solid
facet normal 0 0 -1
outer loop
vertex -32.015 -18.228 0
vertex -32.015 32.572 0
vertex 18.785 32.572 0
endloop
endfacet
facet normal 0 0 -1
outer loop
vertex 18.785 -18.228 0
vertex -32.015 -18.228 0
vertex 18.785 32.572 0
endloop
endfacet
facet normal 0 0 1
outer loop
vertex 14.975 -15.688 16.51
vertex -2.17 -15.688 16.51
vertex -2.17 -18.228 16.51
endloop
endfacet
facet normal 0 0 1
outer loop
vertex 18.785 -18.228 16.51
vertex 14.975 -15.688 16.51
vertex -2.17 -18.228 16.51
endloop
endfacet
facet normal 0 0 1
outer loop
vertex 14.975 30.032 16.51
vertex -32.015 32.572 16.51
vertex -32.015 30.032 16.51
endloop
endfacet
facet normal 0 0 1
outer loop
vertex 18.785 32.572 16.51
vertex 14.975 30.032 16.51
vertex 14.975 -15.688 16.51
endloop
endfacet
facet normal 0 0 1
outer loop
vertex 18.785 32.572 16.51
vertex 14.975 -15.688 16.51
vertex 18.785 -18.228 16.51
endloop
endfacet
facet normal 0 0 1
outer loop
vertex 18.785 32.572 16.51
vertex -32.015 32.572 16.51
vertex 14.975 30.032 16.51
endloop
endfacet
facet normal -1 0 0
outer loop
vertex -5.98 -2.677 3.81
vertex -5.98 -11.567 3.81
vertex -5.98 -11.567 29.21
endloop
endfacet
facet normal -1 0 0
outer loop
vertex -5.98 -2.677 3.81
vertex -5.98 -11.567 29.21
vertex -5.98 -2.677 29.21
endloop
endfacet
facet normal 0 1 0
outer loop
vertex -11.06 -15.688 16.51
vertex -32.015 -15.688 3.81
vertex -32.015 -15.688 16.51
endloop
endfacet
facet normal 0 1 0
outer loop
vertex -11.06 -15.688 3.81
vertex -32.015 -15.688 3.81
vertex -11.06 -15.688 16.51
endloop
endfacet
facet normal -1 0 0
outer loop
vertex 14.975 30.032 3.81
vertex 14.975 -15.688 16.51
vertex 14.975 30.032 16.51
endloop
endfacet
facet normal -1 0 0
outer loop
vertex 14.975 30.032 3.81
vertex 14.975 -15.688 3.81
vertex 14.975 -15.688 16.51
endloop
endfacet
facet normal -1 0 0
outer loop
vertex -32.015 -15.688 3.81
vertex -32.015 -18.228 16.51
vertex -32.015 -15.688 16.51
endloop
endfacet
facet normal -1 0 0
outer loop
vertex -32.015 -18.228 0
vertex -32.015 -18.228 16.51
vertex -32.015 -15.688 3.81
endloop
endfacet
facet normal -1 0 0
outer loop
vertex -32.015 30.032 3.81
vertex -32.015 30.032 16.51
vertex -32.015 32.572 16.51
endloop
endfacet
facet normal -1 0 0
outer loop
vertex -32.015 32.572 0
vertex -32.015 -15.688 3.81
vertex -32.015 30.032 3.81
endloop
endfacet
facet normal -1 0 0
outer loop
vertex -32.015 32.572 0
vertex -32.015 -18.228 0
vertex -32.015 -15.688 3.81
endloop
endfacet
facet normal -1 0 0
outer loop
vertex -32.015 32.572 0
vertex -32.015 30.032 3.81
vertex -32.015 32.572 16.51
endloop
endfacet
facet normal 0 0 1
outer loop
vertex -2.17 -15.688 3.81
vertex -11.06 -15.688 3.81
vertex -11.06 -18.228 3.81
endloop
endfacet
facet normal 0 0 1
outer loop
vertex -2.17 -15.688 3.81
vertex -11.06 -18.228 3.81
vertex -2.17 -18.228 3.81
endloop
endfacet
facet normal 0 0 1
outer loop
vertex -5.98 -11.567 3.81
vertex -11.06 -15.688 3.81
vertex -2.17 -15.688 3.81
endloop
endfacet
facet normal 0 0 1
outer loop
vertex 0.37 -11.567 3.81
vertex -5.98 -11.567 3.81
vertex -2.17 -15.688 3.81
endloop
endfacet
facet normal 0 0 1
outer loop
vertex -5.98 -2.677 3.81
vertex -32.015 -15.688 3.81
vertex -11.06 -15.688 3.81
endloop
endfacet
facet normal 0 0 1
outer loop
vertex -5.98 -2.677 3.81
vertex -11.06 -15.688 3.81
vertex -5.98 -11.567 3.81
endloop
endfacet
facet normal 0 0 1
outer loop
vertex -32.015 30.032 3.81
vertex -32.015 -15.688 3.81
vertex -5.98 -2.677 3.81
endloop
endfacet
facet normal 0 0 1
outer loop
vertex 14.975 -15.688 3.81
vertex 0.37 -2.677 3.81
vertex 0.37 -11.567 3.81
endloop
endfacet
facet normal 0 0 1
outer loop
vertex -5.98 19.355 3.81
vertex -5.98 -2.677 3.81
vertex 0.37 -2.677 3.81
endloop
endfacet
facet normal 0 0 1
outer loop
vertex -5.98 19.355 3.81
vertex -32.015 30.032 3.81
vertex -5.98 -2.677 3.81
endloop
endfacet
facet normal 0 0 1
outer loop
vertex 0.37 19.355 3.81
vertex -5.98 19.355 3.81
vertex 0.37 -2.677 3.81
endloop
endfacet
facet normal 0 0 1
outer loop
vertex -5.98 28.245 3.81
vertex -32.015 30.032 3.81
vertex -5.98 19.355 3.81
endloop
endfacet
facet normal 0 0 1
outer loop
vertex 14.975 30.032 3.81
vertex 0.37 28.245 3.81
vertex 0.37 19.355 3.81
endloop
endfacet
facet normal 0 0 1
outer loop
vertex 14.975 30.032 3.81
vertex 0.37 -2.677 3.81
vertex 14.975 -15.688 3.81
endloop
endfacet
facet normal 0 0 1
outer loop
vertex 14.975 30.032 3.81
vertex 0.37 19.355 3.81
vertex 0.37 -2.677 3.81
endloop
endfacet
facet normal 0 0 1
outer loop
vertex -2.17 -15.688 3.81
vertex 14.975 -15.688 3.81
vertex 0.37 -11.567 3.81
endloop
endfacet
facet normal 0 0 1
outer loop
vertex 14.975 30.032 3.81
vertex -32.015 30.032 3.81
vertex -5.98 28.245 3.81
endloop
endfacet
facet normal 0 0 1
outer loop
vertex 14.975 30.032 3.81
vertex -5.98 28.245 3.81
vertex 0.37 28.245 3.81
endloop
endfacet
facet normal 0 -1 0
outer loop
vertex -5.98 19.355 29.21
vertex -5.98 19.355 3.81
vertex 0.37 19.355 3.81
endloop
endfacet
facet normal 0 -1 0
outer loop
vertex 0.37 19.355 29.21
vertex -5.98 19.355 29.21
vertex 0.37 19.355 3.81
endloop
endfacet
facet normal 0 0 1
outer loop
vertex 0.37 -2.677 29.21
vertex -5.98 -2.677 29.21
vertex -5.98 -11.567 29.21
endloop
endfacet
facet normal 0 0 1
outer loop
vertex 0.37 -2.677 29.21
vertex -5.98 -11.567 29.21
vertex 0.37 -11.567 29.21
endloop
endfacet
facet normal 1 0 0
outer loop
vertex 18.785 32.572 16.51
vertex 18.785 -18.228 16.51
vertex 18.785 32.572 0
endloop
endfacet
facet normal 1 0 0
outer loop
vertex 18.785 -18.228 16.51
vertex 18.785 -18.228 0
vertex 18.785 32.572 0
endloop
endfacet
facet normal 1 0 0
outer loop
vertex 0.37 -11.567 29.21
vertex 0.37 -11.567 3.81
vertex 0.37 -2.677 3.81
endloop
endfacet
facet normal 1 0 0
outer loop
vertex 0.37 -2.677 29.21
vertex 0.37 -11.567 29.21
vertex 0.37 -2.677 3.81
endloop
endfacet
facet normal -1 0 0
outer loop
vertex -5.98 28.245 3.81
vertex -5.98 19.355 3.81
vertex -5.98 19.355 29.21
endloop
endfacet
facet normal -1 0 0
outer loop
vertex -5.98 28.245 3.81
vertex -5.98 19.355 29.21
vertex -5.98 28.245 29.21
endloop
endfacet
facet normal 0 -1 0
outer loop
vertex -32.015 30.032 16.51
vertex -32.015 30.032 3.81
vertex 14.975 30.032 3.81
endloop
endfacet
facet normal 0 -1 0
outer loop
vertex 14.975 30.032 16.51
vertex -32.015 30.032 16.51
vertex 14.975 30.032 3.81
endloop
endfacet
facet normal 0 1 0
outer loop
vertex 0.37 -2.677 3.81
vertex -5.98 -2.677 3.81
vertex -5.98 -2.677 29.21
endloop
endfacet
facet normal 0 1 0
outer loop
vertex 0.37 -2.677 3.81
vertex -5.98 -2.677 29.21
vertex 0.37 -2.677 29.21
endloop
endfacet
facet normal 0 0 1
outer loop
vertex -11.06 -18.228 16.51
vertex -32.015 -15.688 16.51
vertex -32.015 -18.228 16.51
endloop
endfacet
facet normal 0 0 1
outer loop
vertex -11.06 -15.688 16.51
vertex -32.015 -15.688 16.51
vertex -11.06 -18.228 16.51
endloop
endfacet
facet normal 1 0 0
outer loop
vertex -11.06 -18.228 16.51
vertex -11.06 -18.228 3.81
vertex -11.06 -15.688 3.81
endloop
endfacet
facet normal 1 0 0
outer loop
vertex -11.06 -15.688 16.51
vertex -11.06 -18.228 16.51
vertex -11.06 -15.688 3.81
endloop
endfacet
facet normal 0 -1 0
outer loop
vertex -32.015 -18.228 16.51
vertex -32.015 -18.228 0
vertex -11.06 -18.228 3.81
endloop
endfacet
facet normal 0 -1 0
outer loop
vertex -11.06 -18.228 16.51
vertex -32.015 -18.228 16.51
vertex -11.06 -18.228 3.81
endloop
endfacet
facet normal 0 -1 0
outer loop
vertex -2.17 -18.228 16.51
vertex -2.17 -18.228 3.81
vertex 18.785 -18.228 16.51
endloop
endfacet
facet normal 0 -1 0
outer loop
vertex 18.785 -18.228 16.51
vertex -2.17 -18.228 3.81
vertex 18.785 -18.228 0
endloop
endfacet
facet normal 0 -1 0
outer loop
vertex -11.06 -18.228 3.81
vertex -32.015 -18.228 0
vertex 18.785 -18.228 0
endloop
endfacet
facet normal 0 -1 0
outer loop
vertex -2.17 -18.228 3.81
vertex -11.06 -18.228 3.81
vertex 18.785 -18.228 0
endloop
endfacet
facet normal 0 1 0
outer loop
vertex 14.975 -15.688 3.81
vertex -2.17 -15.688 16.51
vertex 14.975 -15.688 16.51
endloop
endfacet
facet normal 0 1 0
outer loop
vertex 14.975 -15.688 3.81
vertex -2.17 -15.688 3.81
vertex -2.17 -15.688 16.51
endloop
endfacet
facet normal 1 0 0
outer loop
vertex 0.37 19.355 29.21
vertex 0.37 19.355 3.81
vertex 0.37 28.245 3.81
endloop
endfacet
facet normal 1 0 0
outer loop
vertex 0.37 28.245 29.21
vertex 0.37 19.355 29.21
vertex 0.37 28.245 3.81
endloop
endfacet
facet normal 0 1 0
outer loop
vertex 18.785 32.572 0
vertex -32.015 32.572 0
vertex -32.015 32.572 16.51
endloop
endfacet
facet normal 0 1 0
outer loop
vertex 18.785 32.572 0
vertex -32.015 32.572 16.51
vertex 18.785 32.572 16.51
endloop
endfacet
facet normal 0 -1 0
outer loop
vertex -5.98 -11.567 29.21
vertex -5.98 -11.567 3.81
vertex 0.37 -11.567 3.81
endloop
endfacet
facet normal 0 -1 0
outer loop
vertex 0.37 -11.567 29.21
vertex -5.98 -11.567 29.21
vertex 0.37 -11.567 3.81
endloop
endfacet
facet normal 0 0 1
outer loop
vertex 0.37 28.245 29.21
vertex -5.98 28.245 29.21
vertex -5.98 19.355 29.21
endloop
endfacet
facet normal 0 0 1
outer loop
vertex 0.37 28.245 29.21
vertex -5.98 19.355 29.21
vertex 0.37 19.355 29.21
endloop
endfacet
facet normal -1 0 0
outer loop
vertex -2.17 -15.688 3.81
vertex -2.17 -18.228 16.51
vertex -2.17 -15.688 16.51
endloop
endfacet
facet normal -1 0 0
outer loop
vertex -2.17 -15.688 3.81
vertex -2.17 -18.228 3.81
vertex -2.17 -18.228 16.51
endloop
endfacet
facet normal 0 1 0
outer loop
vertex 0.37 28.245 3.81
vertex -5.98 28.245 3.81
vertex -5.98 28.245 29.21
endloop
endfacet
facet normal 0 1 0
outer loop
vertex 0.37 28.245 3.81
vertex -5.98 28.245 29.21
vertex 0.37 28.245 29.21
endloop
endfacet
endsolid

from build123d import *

# Parameters (mm, degrees)
F0_W      = 50.8
F0_H      = 50.8
F1_DEPTH  = 3.81
F2_W      = 50.8
F2_H      = 2.54
F3_DEPTH  = 12.7
F4_W      = 20.955
F4_H      = 2.54
F5_DEPTH  = 12.7
F6_W      = 20.955
F6_H      = 2.54
F7_DEPTH  = 2.54
F8_W      = 3.81
F8_H      = 45.72
F9_DEPTH  = 2.54
F10_DEPTH = 10.16
F11_W     = 6.35
F11_H     = 8.89
F12_DEPTH = 25.4
F13_W     = 6.35
F13_H     = 8.89
F14_DEPTH = 25.4


with BuildPart() as f1:
    # F0 (on Top) → F1 (new body)
    with BuildSketch(Plane.XY):
        with Locations((-6.6145006567, 7.1719978217)):
            Rectangle(F0_W, F0_H)
    extrude(amount=F1_DEPTH)

    # F2 (on face) → F3 (join)
    with BuildSketch(Plane.XY.offset(3.81)):
        with Locations((-6.6145006567, 31.3019978217)):
            Rectangle(F2_W, F2_H)
    extrude(amount=F3_DEPTH)

    # F4 (on face) → F5 (join)
    with BuildSketch(Plane.XY.offset(3.81)):
        with Locations((-21.5370006567, -16.9580021783)):
            Rectangle(F4_W, F4_H)
    extrude(amount=F5_DEPTH)

    # F6 (on face) → F7 (join)
    with BuildSketch(Plane.XY.offset(3.81)):
        with Locations((8.3079993433, -16.9580021783)):
            Rectangle(F6_W, F6_H)
    extrude(amount=F7_DEPTH)

    # F8 (on face) → F9 (join)
    with BuildSketch(Plane.XY.offset(3.81)):
        with Locations((16.8804993433, 7.1719978217)):
            Rectangle(F8_W, F8_H)
    extrude(amount=F9_DEPTH)

    # F10 (add): a face of the model
    f10_faces = [f1.faces().sort_by_distance(p)[0] for p in [
        (6.4029993433, -16.214133305, 6.35),
    ]]
    extrude(f10_faces, amount=F10_DEPTH)

    # F11 (on face) → F12 (join)
    with BuildSketch(Plane.XY.offset(3.81)):
        with Locations((-2.8045006567, -7.122488919)):
            Rectangle(F11_W, F11_H)
    extrude(amount=F12_DEPTH)

    # F13 (on face) → F14 (join)
    with BuildSketch(Plane.XY.offset(3.81)):
        with Locations((-2.8045006567, 23.80011379)):
            Rectangle(F13_W, F13_H)
    extrude(amount=F14_DEPTH)


solid = f1.part
